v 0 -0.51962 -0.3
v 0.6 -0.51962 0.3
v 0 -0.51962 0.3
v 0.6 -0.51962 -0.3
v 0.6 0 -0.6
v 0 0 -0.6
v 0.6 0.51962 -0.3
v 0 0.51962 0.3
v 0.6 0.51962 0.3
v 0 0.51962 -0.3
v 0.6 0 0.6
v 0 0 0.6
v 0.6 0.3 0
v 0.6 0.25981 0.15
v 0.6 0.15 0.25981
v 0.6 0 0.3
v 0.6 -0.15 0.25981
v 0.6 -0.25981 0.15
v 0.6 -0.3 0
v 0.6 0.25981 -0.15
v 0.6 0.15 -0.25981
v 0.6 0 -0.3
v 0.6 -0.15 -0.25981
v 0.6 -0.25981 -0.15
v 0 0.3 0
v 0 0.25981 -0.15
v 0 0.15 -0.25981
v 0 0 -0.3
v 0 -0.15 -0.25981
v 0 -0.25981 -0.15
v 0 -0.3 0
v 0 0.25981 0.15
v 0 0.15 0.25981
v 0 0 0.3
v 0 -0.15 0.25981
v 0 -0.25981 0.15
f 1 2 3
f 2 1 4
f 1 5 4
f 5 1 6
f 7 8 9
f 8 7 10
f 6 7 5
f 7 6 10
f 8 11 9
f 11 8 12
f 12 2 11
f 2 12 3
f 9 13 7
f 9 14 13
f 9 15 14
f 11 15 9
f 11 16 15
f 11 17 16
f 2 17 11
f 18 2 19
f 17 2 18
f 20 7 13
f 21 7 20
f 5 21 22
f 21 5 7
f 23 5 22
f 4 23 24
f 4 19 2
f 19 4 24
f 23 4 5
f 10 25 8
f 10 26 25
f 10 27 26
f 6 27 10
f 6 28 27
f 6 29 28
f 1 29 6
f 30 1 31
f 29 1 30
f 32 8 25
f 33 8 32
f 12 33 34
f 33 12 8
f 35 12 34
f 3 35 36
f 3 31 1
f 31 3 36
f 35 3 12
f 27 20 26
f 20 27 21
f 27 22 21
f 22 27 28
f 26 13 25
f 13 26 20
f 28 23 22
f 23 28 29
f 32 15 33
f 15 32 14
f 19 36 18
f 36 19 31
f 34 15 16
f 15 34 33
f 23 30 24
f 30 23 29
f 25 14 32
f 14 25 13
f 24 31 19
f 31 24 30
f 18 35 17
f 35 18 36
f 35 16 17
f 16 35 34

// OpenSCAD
module nut(rotation=0) 
{
    hex_diameter = 1.2;
    hex_length = 0.6;
    hole = 0.6;
 
    
    rotate([0,90,rotation]) 
    color([0.0,0.8,1.0])
    translate([0,0,hex_length*0.5]) 
    {
        difference() {
            cylinder(h=hex_length, r=hex_diameter/2, $fn = 6, center=true);
            cylinder(h=hex_length+0.1, r=hole/2, $fn = 12, center=true);
        }
    }
}

nut();
